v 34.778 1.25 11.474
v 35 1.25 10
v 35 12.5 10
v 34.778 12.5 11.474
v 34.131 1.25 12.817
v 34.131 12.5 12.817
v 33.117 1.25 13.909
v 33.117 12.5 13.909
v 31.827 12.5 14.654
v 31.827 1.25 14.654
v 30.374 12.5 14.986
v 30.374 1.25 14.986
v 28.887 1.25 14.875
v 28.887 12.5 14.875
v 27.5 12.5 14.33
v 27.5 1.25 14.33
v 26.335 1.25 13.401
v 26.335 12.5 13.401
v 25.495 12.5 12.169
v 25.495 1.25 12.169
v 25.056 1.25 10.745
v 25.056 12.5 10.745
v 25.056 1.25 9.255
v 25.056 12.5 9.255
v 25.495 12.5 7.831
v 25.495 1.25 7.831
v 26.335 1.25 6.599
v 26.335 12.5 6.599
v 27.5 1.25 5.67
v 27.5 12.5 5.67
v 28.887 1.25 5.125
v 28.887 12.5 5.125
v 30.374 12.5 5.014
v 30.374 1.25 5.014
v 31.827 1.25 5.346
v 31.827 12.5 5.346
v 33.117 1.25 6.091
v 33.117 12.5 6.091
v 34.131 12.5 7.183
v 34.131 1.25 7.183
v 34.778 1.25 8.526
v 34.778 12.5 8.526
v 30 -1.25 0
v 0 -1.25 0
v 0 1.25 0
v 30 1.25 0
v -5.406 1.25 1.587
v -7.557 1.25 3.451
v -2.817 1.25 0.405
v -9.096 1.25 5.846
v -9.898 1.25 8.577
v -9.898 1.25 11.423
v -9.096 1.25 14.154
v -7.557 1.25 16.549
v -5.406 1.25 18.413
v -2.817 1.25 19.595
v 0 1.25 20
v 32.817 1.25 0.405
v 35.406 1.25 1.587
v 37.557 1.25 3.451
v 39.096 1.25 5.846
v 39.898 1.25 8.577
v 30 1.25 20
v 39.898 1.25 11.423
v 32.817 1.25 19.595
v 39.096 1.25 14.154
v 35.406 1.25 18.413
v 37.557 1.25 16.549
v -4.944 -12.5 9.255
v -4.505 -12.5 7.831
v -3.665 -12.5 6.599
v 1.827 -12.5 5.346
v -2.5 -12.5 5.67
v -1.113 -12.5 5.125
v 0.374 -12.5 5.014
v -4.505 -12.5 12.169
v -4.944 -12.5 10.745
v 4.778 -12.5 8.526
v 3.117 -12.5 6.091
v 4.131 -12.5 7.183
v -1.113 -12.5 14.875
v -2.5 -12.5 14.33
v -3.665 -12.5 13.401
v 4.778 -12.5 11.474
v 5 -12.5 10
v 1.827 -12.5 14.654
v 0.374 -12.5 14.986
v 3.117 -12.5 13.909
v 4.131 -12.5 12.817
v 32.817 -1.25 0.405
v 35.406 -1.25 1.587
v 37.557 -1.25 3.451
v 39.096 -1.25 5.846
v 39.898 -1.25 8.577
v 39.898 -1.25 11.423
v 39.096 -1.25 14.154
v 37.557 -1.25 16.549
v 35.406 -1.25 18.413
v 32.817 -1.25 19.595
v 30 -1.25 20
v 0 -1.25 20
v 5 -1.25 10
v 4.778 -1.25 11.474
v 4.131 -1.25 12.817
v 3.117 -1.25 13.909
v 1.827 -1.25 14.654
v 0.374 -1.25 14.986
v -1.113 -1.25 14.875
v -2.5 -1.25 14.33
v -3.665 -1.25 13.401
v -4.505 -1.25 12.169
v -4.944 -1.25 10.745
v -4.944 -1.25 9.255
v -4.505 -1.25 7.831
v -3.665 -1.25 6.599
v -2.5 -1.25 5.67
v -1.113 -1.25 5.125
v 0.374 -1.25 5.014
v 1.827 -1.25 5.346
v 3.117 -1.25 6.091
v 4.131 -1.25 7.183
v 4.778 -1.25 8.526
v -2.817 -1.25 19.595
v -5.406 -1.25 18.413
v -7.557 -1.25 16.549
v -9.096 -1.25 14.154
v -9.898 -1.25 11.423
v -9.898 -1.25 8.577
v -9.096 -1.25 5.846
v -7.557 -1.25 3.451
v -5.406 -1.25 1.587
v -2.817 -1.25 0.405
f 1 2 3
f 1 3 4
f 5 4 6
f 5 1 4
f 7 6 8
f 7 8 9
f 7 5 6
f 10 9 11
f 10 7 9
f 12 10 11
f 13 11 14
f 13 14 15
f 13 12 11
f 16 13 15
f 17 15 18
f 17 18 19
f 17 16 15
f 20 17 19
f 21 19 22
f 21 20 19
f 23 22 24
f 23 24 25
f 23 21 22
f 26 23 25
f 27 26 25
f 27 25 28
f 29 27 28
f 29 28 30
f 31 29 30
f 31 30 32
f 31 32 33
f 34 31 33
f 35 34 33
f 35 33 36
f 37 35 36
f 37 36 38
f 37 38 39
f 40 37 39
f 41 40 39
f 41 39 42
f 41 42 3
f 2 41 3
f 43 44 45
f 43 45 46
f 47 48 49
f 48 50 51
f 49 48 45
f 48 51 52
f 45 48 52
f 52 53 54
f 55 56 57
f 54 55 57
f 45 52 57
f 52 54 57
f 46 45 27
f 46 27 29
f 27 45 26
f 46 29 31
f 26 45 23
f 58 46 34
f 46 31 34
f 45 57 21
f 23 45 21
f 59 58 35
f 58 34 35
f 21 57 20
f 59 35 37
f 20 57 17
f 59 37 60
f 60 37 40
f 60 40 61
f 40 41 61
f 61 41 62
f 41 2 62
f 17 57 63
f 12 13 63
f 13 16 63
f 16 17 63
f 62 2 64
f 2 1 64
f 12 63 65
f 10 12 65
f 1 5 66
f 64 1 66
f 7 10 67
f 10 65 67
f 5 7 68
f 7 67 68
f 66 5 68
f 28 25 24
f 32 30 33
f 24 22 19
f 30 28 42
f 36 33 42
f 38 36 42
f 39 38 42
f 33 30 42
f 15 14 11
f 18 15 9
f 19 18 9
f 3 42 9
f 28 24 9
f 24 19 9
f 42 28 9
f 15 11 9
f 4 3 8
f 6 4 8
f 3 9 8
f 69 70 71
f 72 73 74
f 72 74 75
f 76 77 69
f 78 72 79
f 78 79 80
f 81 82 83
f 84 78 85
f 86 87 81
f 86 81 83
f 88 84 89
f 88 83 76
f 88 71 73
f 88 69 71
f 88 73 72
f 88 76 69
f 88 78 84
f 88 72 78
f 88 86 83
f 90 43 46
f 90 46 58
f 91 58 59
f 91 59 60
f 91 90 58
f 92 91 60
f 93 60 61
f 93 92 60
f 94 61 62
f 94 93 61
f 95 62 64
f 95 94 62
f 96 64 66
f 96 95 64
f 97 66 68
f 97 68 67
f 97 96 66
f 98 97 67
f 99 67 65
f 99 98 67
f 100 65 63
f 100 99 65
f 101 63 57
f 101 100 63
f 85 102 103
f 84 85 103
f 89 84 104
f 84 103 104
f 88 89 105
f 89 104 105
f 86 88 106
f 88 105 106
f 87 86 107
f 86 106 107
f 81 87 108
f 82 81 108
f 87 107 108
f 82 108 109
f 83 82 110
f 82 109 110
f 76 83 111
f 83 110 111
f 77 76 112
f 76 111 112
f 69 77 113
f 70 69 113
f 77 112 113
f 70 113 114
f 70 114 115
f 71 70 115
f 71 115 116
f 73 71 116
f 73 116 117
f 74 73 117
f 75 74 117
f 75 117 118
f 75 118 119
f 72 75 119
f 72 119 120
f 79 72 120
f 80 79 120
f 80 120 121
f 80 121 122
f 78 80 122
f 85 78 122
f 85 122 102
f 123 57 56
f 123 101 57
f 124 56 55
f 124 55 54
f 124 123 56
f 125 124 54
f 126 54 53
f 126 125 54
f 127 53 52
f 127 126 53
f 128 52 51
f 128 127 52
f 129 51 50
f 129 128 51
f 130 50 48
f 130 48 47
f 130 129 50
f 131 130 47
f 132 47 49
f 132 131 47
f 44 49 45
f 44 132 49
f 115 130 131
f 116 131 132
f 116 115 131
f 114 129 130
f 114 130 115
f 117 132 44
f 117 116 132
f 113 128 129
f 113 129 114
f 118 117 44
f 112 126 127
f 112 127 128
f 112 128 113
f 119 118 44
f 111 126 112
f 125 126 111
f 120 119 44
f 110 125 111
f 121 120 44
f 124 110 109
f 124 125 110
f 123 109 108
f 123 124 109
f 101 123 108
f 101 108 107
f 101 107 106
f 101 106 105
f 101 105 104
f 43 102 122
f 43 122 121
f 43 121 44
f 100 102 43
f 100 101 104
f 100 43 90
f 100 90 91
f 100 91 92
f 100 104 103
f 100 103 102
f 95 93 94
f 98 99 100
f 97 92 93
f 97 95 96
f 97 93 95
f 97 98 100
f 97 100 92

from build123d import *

# Parameters (mm, degrees)
F0_R     = 5
F1_DEPTH = 1.25
F2_DEPTH = 12.5
F3_DEPTH = 12.5


with BuildPart() as f1:
    # F0 (on Front) → F1 (new body, symmetric)
    with BuildSketch(Plane.XZ):
        with BuildLine():
            ThreePointArc((0, 20), (-10, 10), (0, 0))
            Line((0, 0), (30, 0))
            ThreePointArc((30, 0), (40, 10), (30, 20))
            Line((30, 20), (0, 20))
        make_face()
        with Locations((0, 10)):
            Circle(F0_R, mode=Mode.SUBTRACT)
        with Locations((30, 10)):
            Circle(F0_R, mode=Mode.SUBTRACT)
        with Locations((30, 10)):
            Circle(F0_R)
        with Locations((0, 10)):
            Circle(F0_R)
    extrude(amount=F1_DEPTH, both=True)

    # F0 (on Front) → F2 (join)
    with BuildSketch(Plane.XZ):
        with Locations((0, 10)):
            Circle(F0_R)
    extrude(amount=F2_DEPTH)

    # F0 (on Front) → F3 (join)
    with BuildSketch(Plane.XZ):
        with Locations((30, 10)):
            Circle(F0_R)
    extrude(amount=-F3_DEPTH)


solid = f1.part
